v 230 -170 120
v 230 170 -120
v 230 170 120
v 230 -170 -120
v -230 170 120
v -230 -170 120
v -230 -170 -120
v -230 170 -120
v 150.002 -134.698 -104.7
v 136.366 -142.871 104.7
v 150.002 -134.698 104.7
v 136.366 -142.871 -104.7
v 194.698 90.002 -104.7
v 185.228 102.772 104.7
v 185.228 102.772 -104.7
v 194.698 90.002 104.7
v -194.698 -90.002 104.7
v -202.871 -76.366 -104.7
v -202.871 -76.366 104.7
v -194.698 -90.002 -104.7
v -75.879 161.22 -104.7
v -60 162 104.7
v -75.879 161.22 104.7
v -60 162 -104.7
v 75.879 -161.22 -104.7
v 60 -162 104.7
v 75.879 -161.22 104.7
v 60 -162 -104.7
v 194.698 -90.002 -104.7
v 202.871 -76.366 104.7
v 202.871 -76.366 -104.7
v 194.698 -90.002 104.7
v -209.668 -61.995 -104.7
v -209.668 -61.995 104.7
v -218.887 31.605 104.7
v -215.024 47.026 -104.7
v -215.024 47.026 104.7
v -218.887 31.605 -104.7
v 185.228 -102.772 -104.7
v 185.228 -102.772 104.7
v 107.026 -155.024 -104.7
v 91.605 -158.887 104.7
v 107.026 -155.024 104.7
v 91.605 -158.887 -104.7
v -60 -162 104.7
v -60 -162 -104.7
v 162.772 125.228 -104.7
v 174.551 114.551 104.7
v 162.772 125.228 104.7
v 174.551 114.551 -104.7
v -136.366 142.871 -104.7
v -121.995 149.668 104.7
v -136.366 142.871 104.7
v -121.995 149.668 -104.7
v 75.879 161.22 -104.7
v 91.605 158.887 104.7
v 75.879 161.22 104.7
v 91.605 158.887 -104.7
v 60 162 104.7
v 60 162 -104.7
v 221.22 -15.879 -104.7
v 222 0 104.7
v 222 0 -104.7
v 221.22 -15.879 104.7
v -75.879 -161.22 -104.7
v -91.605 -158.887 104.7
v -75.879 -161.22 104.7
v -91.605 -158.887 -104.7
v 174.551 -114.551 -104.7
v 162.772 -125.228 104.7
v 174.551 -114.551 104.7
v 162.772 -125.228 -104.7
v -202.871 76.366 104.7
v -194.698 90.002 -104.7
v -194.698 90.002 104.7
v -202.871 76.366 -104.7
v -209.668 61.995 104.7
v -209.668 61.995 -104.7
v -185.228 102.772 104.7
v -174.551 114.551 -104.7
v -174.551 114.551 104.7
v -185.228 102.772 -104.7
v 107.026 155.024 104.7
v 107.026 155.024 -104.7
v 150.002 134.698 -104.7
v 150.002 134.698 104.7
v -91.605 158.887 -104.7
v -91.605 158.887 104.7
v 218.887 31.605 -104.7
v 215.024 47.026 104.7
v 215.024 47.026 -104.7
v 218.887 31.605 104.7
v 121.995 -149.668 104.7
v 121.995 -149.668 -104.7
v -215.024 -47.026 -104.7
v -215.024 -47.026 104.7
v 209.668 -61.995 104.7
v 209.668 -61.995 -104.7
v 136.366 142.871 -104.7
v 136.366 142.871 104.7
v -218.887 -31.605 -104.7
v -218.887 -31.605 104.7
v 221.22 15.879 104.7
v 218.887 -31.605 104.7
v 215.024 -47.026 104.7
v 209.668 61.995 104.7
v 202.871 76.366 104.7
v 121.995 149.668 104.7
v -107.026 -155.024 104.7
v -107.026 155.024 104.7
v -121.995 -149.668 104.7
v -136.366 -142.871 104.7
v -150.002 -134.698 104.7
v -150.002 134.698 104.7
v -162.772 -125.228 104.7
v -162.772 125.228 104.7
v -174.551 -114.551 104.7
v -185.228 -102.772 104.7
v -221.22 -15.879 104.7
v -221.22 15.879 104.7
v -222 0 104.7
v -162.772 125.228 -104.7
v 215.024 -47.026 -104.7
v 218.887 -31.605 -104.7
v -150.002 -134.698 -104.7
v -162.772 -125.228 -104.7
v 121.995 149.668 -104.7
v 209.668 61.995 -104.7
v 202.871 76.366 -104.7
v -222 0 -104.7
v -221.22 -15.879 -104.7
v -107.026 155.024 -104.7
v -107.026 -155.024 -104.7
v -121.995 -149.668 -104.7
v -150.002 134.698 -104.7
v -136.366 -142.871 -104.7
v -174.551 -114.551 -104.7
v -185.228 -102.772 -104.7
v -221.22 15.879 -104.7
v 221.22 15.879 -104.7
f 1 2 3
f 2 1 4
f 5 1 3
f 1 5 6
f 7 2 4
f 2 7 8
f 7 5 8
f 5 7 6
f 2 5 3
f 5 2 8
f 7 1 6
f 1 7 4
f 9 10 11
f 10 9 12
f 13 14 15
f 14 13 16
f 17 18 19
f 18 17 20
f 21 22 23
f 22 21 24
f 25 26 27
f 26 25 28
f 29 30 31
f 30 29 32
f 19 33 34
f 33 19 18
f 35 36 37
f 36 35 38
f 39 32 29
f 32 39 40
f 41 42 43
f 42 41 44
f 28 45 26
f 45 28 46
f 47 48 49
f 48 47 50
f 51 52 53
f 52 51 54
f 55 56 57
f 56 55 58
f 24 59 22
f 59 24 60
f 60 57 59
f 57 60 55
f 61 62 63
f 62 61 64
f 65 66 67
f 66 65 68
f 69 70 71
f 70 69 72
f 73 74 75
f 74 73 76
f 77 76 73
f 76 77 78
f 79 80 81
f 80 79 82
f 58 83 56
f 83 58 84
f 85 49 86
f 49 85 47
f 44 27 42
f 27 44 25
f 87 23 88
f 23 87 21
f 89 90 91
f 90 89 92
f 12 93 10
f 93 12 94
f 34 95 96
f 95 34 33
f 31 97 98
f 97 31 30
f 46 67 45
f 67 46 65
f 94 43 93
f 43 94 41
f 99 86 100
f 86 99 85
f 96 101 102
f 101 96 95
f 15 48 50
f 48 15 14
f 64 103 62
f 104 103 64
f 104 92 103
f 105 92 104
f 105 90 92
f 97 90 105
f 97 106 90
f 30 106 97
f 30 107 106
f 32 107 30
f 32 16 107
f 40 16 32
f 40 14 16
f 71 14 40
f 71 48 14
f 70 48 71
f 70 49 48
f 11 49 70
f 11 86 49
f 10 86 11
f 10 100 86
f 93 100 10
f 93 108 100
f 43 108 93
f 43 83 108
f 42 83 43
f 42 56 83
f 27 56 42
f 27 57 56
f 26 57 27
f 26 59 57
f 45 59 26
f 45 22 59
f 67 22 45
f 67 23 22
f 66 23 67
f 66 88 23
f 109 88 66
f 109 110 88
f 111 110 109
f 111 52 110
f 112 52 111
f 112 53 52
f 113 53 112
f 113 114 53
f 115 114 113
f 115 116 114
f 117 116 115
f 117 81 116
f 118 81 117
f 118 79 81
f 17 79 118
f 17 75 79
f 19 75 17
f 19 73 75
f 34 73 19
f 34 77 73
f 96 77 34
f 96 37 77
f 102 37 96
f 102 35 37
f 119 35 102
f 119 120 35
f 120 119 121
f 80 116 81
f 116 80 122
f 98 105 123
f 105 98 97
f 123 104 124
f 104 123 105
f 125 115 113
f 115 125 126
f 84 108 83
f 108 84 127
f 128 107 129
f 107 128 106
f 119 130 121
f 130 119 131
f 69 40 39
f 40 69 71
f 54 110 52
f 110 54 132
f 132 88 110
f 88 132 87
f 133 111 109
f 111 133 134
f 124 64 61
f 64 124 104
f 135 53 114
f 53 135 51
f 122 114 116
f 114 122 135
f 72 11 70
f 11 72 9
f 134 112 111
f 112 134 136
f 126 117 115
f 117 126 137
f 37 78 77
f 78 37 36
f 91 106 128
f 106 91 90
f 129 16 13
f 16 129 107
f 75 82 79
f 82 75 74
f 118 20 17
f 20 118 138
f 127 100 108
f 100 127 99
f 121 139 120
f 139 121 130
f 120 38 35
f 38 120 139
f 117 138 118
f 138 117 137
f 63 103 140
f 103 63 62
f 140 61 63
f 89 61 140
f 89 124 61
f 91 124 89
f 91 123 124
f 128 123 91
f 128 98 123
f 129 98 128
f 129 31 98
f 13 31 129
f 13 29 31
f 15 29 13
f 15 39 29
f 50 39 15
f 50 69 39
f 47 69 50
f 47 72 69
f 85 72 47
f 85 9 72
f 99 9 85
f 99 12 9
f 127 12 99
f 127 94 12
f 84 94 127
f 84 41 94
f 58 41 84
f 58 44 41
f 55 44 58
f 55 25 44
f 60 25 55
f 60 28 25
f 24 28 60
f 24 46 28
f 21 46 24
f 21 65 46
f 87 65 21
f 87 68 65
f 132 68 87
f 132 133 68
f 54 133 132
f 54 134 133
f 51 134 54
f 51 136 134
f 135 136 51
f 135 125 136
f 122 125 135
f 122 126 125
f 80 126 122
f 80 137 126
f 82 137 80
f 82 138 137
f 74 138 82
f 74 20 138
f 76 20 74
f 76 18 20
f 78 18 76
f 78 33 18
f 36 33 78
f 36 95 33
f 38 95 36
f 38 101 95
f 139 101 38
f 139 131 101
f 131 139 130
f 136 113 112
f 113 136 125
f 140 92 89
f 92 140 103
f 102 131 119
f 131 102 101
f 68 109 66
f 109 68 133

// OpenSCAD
// ============================================================================
// Atom Lithography Machine — Parametric OpenSCAD Module (S9.2-02)
// ============================================================================
// part_id           : S9.2-02
// parent_bom_id     : S9.2
// subsystem         : S9
// part_name         : Yedek duoplasmatron katot/filaman, TSP kartus ve CF bakir conta kiti
// material          : OFHC Cu
// temp_stage        : 300 K
// vacuum_grade      : UHV 1e-9 mbar
// tolerance         : ISO 2768-mK
// computed_mass_kg  : 14.50000
// envelope_mm       : 488.800 x 356.400 x 240.000
// design_maturity   : M0_M1_DETAILED_CAD_DESIGN_ONLY
// no_lab_measurement: true
// iec61508_certified: false
// semi_s2_certified : false
// Units: millimeters (mm)
// ============================================================================

$fn = 64;

// Nominal bounding envelope parameters (mm)
bbox_x = 488.8000;
bbox_y = 356.4000;
bbox_z = 240.0000;

// Part-specific parametric dimensions
chest_dx_mm = 460.0;
chest_dy_mm = 340.0;
chest_dz_mm = 240.0;

// Interface / port parameters (mm)

module part_S9_2_02() {
  difference() {
    union() {
      // Cleanroom ESD storage case outer envelope
      cube([460.000, 340.000, 240.000], center=true);
    }
    // Internal padded kit tray cavity
    hull() {
      translate([-60.000, 0, 0]) cylinder(d=324.000, h=209.400, center=true);
      translate([60.000, 0, 0]) cylinder(d=324.000, h=209.400, center=true);
    }
  }
}

// World assembly mounting transform (global machine frame, mm / deg):
// translate([-620.000, -1520.000, 120.000]) rotate([0.000, 0.000, 0.000]) part_S9_2_02();

part_S9_2_02();
